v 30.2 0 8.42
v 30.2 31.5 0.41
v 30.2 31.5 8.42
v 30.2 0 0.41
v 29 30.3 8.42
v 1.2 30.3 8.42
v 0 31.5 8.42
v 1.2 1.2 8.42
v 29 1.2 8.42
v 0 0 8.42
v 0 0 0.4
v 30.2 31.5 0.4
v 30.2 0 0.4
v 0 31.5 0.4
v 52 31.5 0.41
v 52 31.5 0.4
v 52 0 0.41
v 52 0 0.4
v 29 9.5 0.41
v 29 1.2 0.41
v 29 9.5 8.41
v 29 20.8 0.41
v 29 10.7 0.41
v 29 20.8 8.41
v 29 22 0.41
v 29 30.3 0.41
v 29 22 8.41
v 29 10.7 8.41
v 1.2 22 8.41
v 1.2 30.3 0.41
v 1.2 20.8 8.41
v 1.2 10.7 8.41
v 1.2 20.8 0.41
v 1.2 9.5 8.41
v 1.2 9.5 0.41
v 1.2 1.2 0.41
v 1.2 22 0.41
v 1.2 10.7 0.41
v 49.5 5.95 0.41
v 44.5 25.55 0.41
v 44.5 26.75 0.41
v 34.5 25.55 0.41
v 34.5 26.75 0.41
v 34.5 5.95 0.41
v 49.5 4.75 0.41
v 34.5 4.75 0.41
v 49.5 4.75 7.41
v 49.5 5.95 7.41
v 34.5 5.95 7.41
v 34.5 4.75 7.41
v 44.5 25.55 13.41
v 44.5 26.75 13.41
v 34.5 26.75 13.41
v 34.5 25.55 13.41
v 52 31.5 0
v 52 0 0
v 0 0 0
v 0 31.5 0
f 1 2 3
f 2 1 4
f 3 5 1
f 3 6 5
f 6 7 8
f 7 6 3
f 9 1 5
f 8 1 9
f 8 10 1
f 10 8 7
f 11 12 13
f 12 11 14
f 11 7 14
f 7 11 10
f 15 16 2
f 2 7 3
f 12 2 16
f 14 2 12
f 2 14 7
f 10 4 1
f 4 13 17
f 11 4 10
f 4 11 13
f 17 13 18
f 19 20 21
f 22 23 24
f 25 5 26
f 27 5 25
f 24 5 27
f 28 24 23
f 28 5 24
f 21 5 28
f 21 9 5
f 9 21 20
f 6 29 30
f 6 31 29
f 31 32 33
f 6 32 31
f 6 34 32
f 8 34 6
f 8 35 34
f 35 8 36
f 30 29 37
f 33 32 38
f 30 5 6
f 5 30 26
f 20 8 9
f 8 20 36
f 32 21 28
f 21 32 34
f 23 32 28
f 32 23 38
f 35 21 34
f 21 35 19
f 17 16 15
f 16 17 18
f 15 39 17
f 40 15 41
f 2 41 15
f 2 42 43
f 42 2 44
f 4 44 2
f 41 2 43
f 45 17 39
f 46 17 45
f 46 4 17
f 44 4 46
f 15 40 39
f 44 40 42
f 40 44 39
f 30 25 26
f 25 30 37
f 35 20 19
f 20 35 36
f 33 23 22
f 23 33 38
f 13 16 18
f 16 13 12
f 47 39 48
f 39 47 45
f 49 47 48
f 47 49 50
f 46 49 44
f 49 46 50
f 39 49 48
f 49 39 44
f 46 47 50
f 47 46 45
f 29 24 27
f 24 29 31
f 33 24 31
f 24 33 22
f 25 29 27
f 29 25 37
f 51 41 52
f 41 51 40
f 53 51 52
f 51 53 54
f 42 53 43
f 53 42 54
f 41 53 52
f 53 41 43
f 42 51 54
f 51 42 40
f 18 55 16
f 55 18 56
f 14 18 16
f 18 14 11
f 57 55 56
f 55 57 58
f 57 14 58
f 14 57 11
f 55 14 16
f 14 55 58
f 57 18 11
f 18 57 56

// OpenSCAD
// file: ../../Base/Boxes.scad
// Fischertechnik Box Foundation
// Pre-designed Boxes

use <Constants.scad>

include <PlacementOptions.scad>

box190Width = 190;
box190Depth = 130;
box130Width = 130;
box130Depth = 95;

// Values are from an original ec3 box
topBottomDifference = 1.5;
outerHeight = 40;
innerHeight = 38.2;
baseThickness = outerHeight - innerHeight;
stackExcess = 5.7;
radius = 3.5;
wallThickness = 1.5;
tolerance = 0.2;
stackOffset = innerHeight - stackExcess;

boxUsageHeight = stackOffset;
boxWallThickness = wallThickness;
boxBaseThickness = baseThickness;
boxWebWidth = 3.0;

// getBoxWallThickness()
// Gets the wall thickness of a Fischertechnik Box
function getBoxWallThickness() = boxWallThickness;

// getBoxUsageHeight()
// Gets the usable height of a Fischertechnik box
function getBoxUsageHeight() = boxUsageHeight;

// getBoxInnerHeight()
// Gets the inner height of a Fischertechnik box, including the stack excess
function getBoxInnerHeight() = innerHeight;

// getBoxBaseThickness()
// Gets the thickness of the Fischertechnik box base.
function getBoxBaseThickness() = boxBaseThickness;

// getBoxWebWidth()
// Gets the width of a box web
function getBoxWebWidth() = boxWebWidth;

// getBox190Space()
// Gets the usable inner space of a Box 190 as an x/y-list
function getBox190Space() = [
    box190Width - 2*getBoxWallThickness() - topBottomDifference, 
    box190Depth - 2*getBoxWallThickness() - topBottomDifference ];

// BoxBase(width, depth)
// Creates an empty stackable Fischertechnik compatible box
// width = Outer width of the box (190, 130, ...)
// depth = Outer depth of the box (130, 95, ...)

module BoxBase(width, depth, height=outerHeight) {    
    thinPlate = 0.01;

    innerHeight = height - baseThickness;    
    
    module BodyPlate(width, depth) {
        translate([radius, radius])
        hull() {
            w = width-2*radius;
            d = depth-2*radius;
            cube([w, d, thinPlate]);
            cylinder(thinPlate, r=radius, $fn=getFragments());
            translate([w, 0])
                cylinder(thinPlate, r=radius, $fn=getFragments());
            translate([w, d])
                cylinder(thinPlate, r=radius, $fn=getFragments());
            translate([0, d])
                cylinder(thinPlate, r=radius, $fn=getFragments());
        }
    }
    
    module Body(tolerance=tolerance) {
        hull() {
            // Bottom with tolerance to fit into the original boxes when stacked
            translate([-wallThickness+tolerance, -wallThickness+tolerance, -baseThickness])
                BodyPlate(width-topBottomDifference-2*tolerance, depth-topBottomDifference-2*tolerance);
            
            // Top
            translate([-wallThickness-topBottomDifference/2, -wallThickness-topBottomDifference/2, innerHeight-thinPlate])
                BodyPlate(width, depth);
         }
    }

    module Cutoff() {
        hull() {
            coWidth = width - 2*wallThickness;
            coDepth = depth - 2*wallThickness;
            
            // Bottom
            BodyPlate(coWidth-topBottomDifference, coDepth-topBottomDifference);

            // Top
            translate([-topBottomDifference/2, -topBottomDifference/2, innerHeight+thinPlate]) 
                BodyPlate(coWidth, coDepth);
        }
    }
    
    difference() {        
        Body();
        Cutoff();
        stackOffset = innerHeight - stackExcess;
        translate([0, 0, stackOffset + baseThickness])
            Body(tolerance=0);
    }
}

// Creates the Fischertechnik empty box 130x190 mm and places it at position 0,0
// 190x130 are the outer sizes, the inner space is slightly smaller. Use getBox190Space() to get the inner sizes.
// The box is positioned that the usable inner space is at the 0,0,0 position. The

module Box190() {
    BoxBase(box190Width, box190Depth);
}

// Gets the usable inner space of a Box 130 as an x/y-list
function getBox130Space() = [
    box130Width - 2*getBoxWallThickness() - topBottomDifference, 
    box130Depth - 2*getBoxWallThickness() - topBottomDifference ];

// Creates the Fischertechnik empty box 95x130 mm and places it at position 0,0
// 190x130 are the outer sizes, the inner space is slightly smaller. Use getBox190Space() to get the inner sizes.
// The box is positioned that the usable inner space is at the 0,0,0 position. The

module Box130() {
    BoxBase(box130Width, box130Depth);
}

// Creates a web at the specified box walls
// corner 0 = LowerLeft, 1 = UpperLeft, 2 = UpperRight, 3 = LowerRight
// side 0 = LeftOfCorner, 1 = RightOfCorner
// distance = Distance in mm from the corner
// boxSpace = inner width and depth of the box (default: Box 190)
// webWidth = length of the web (default is 3 mms)
// webThickness = thickness of the web (default is 1 mm)

module BoxWeb(corner, side, distance, boxSpace=getBox190Space(), webWidth=getBoxWebWidth(), webThickness=1.0) {
    sink = getBoxWallThickness()/2;

    width = (corner % 2 == 0) ? 
            (side == LeftOfCorner ? webWidth : webThickness) :
            (side == LeftOfCorner ? webThickness : webWidth);

    depth = (corner % 2 == 0) ? 
            (side == RightOfCorner ? webWidth : webThickness) :
            (side == RightOfCorner ? webThickness : webWidth);
    
    xDiff = corner == LowerLeft ? 
                (side == LeftOfCorner ? -sink : distance) :
            (corner == UpperLeft ?                
                (side == LeftOfCorner ? distance : -sink) :
            (corner == UpperRight ?
                (side == LeftOfCorner ? boxSpace.x-webWidth+sink : boxSpace.x-distance-webThickness) :
                (side == LeftOfCorner ? boxSpace.x-distance-webThickness: boxSpace.x-webWidth+sink)));

    yDiff = corner == LowerLeft ? 
                (side == RightOfCorner ? -sink : distance) :
            (corner == UpperLeft ?
                (side == RightOfCorner ? boxSpace.y-distance : boxSpace.y-webWidth+sink) :
            (corner == UpperRight ?
                (side == RightOfCorner ? boxSpace.y-webWidth+sink : boxSpace.y-distance) :
                (side == RightOfCorner ? distance : -sink)));
    
    translate([xDiff, yDiff, -getExcess()])
        cube([width, depth, boxUsageHeight + 2*getExcess()]);
}
// file: ../../Base/Rotation.scad
// Fischertechnik Box Foundation
// Geometry Helpers Rotation

include <PlacementOptions.scad>

// getRotatedSpace(space, rotation=NoRotation)
// Rotates the space dependent on the specified rotation

function getRotatedSpace(space, rotation=NoRotation) = [
    (rotation == Rotate90 || rotation == Rotate270) ? space.y : space.x,
    (rotation == Rotate90 || rotation == Rotate270) ? space.x : space.y
];

// Rotates the given space around the fixed left lower corner
// space = the space the children needs as width/depth list [width,depth]
// rotation = 0 Rotate0 degrees, 1 Rotate90 degrees, 2 Rotate180 degrees, 3 Rotate270 degrees (equivalent to -90)

module RotateFix(space, rotation=NoRotation) {
    dy = (rotation == Rotate0 || rotation == Rotate270) ? 0 :
        (rotation == Rotate90) ? space.x :
        space.y;
    dx = (rotation < Rotate180) ? 0 :
        (rotation == Rotate180) ? space.x :
        space.y;
    
    translate([dx, dy, 0])
        rotate([0, 0, rotations[rotation]])
            children();
}
// file: ../../Base/Alignment.scad
// Fischertechnik Box Foundation
// Geometry Helpers Alignment

include <PlacementOptions.scad>

// getAlignedX(elementWidth, spaceWidth, align=AlignRight, offset=0)
// Gets the aligned X offset of an element with the given
// width in the given space.
// elementWidth = The width of the element to positon
// spaceWidth = The space where the element should be aligned
// align = 0 AlignLeft, 1 AlignCenter, 2 AlignRight
// offset = an optional offset from the aligned position. When
// aligned left or centered, then positive values are in X direction.
// When aligned right then positive values are in negative X direction.

function getAlignedX(elementWidth, spaceWidth, align=AlignRight, offset=0) =
    (align == AlignLeft) ?
        offset :
        ((align == AlignCenter) ?
        (spaceWidth - elementWidth)/2 + offset :
        spaceWidth - offset - elementWidth);

// getAlignedY(elementDepth, spaceDepth, align=AlignTop, offset=0)
// Gets the aligned Y offset of an element with the given
// depth in the given space.
// elementDepth = The depth of the element to positon
// spaceDepth = The space where the element should be aligned
// align = 0 AlignBottom, 1 AlignCenter, 2 AlignTop
// offset = an optional offset from the aligned position. When
// aligned bottom or centered, then positive values are in Y direction.
// When aligned top then positive values are in negative Y direction.

function getAlignedY(elementDepth, spaceDepth, align=AlignTop, offset=0) =
    (align == AlignBottom) ?
        offset :
        ((align == AlignCenter) ?
        (spaceDepth - elementDepth)/2 + offset :
        spaceDepth - offset - elementDepth);
// file: ../../Base/Placement.scad
// Fischertechnik Box Foundation
// Geometry Helpers Placement

use <Constants.scad>
use <Alignment.scad>
use <Rotation.scad>
use <Boxes.scad>

include <PlacementOptions.scad>

// Place(x=0, y=0, elementSpace=[0,0], alignX=AlignLeft, alignY=AlignBottom, rotation=Rotate0, boxSpace=getBox190Space())
// Places the child at the specified position
// y = Y-Position. This is a relative position when an X aligment is specified.
// x = X-Position. This is a relative position when an Y aligment is specified.
// elementSpace = space of the element to be placed [x,y]
// alignX = -1=NoAlign, 0 AlignLeft, 1 AlignCenter, 3 AlignRight (elementSpace and boxSpace required!)
// alignY = -1=NoAlign, 2 AlignBottom, 1 AlignCenter, 4 AlignTop (elementSpace and boxSpace required!)
// rotation = 0 Rotate0 0 degrees, 1 Rotate90 90 degrees, 
// 2 Rotate180 180 degrees, 3 Rotate270 270 degrees (equivalent to -90)
// boxSpace = Inner space of the box where the placement occurs [x,y] - default is Box 190x130 inner space

module Place(x=0, y=0, elementSpace=[0,0], 
  alignX=AlignLeft, alignY=AlignBottom, 
  rotation=NoRotation, boxSpace=getBox190Space()) {

    module Position(x, y, space, rotation=Rotate0) {
        translate([x, y, 0])
            RotateFix(space, rotation)
                children();
    }

    space = getRotatedSpace(elementSpace, rotation);
    alignedX = getAlignedX(space.x, boxSpace.x, alignX, x);
    alignedY = getAlignedY(space.y, boxSpace.y, alignY, y);
    Position(alignedX, alignedY, elementSpace, rotation)
        children();
}

// Center(space=getBox130Space(), elementSpace=[0,0])
// space = Space where the children is centered. For cylinder use centered=true and no elementSpace.
// elementSpace = space of the element to be centered [x,y]

module Center(space=getBox190Space(), elementSpace=[0,0]) {
    Place(elementSpace=elementSpace, boxSpace=space, alignX=AlignCenter, alignY=AlignCenter)
        children();
}

// CenterHorizontal(width=0, y=0, offset=0, space=getBox130Space())
// width = Width of the element to be placed.
// y = Y position of the element
// offset = Offset from the center position (negative will be left of the center)
// space = Space where the element is placed

module CenterHorizontal(width=0, y=0, offset=0, space=getBox190Space()) {
    Place(x=offset, y=y, elementSpace=[width, 0], boxSpace=space, alignX=AlignCenter)
        children(0);
}

// CenterVertical(depth=0, x=0, offset=0, space=getBox130Space())
// depth = Depth of the element to be placed.
// x = X position of the element
// offset = Offset from the center position (negative will be down of the center)
// space = Space where the element is placed

module CenterVertical(depth=0, x=0, offset=0, space=getBox190Space()) {
    Place(x=x, y=offset, elementSpace=[0, depth], boxSpace=space, alignY=AlignCenter)
        children(0);
}

// getIsVertical(align)
// True if the specified alignment needs a vertical orientation for a divider (AlignRight, AlignLeft)

function getIsVertical(align) = (align == AlignRight || align == AlignLeft);

// getIsHorizontal(align)
// True if the specified alignment needs a horizontal orientation for a divider (AlignTop, AlignBottom)

function getIsHorizontal(align) = (align == AlignTop || align == AlignBottom);
// file: ../../Base/Helper.scad
// Fischertechnik Box Foundation
// Helper functions

include <PlacementOptions.scad>

// getRotation(rotations, i)
// gets the rotation with index i, even if rotations or rotations[i] is undefined.
// If undefined, NoRotation ist returned.
// rotations = list of Rotate-constants
// i = Index of the rotation
function getRotation(rotations, i) = (is_undef(rotations) || is_undef(rotations[i])) ? NoRotation : rotations[i];
// file: ../../Base/PlacementOptions.scad
// Fischertechnik Box Foundation
// Placement Options

// Alignment
NoAlign = 0;
AlignLeft = 1;
AlignBottom = 2;
AlignCenter = 3;
AlignRight = 4;
AlignTop = 5;

// Element rotation degree steps
rotations = [0, -90, -180, -270];

// Rotation
NoRotation = 0;
Rotate0 = 0;
Rotate90 = 1;
Rotate180 = 2;
Rotate270 = 3;

// Docking (seen from above)
NoDock = -1;
DockLeft = 0;
DockTop = 1;
DockRight = 2;
DockCorner = 2;
DockBottom = 3;

// Web corners
LowerLeft = 0;
UpperLeft = 1;
UpperRight = 2;
LowerRight = 3;

// Web position relative to corner
LeftOfCorner = 0;
RightOfCorner = 1;
// file: ../../Elements/FrameBracketWithoutWorm.scad
// Fischertechnik Box Library
// Frame  for bracket without worm
// 31046

use <../Base/Constants.scad>
use <../ModelBase/Complex.scad>

// getFrameBracketWithoutWormSpace()
// Gets the space for a frame for a bracket with worm.

function getFrameBracketWithoutWormSpace() = getFrameBracketSpace();

// FrameBracketWithoutWorm()
// Frame for bracket with worm.

module FrameBracketWithoutWorm() {
    FrameBracket([ 10, getDividerThickness(), 13 ]);
}

// Test
color("lightgray")
FrameBracketWithoutWorm();
// file: ../../Elements/FrameBracketWithWorm.scad
// Fischertechnik Box Library
// Frame  for bracket with worm
// 31045

use <../Base/Constants.scad>
use <../ModelBase/Complex.scad>

// getFrameBracketWithWormSpace()
// Gets the space for a frame for a bracket with worm.

function getFrameBracketWithWormSpace() = getFrameBracketSpace();

// FrameBracketWithWorm()
// Frame for bracket with worm.

module FrameBracketWithWorm() {
    FrameBracket([ 15, getDividerThickness(), 7 ]);
}

// Test
color("lightgray")
FrameBracketWithWorm();
// file: ../../Elements/AxisClip10.scad
// Fischertechnik Box Library
// Axis for clip 10
// 31023

use <../ModelBase/Simple.scad>
use <../Base/Constants.scad>

width = 12;
depth = 12;
height = 23;
upperDiameter = 3.6;
clipHeight = 10;

// getAxisClip10Space()
// Gets the space of a frame for a clip 10 with spring ring (mot2)

function getAxisClip10Space() = [width, depth, height];

// AxisClip10(height, clipHeight)
// Axis for clip 10 with spring ring (mot2)
// height = Height of the complete axis
// clipHeight = Height of the rt for the clip (standard is 10, in mot3 its only 7)

module AxisClip10(height=height, clipHeight=clipHeight) {
    LeveledAxisWithSpace(height, height-clipHeight, getAxisClip10Space(), diameter=upperDiameter);
}

// Tests
color("lightgray")
AxisClip10();
// file: ../../Base/Constants.scad
// Fischertechnik Box Foundation
// Constants

// Constant values necessary for multiple elements

// Base constants
dividerThickness = 1.2;
excess = 0.01;
fragments = 90;
tolerance = 0.8;

// Gets the thickness of a divider 
function getDividerThickness() = dividerThickness;

// Gets the excess that is used to merge walls into each other
function getExcess() = excess;

// Gets amount of fragments of a cylinder
function getFragments() = fragments;

// Gets the inner tolerance of a frame to each side
function getTolerance() = tolerance;


// Fischertechnik specific constants
axisDiameter = 4;
axisBottomDiameter = axisDiameter + 1;
standardEdgeDistance = 2.5;
standardWebDistance = 11.5;
standardCornerLength = 15;
tubeWallFactor = 0.8;
smallPartsFrameHeight = 20;

// Gets axis diameter
function getAxisDiameter() = axisDiameter;

// Gets axis bottom diameter for thicker part at the bottom
function getAxisBottomDiameter() = axisBottomDiameter;

// gets the standard distance to the wall of the box for dockable frames with webs
function getStandardEdgeDistance() = standardEdgeDistance;

// gets the standard distance of each web to the corner of the dockable frame
function getStandardWebDistance() = standardWebDistance;

// gets the standard length of the corner walls of a dockable frame
function getStandardCornerLength() = standardCornerLength;

// gets the wall thickness of a tube.
function getTubeWallThickness() = tubeWallFactor * getDividerThickness();

// gets the frame height for docked small parts boxes.
function getSmallPartsFrameHeight() = smallPartsFrameHeight;
// file: ../../Elements/ComboFrameBrackets.scad
// Fischertechnik Box Library
// Frames for brackets with and without worm
// 31045 + 31046

use <../Base/Constants.scad>
use <../Base/Deployment.scad>
use <../ModelBase/Simple.scad>
use <../ModelBase/Complex.scad>
use <FrameBracketWithWorm.scad>
use <FrameBracketWithoutWorm.scad>

include <../Base/PlacementOptions.scad>

outerDepth = 31.5;

// getComboFrameBracketsSpace()
// Gets the space for a frame for a combination of brackets with worm and without worm.

function getComboFrameBracketsSpace() = [getFrameBracketSpace().x, outerDepth];

// ComboFrameBrackets()
// Frame for a combination of brackets with worm and without worm.

module ComboFrameBrackets() {
    Space(getComboFrameBracketsSpace());
    Frame([getFrameBracketWidth(), outerDepth - 2*getDividerThickness() - getTolerance(), getFrameBracketSpace().z]);
    DeployVertical(outerDepth, [getFrameBracketWithWormSpace(), getFrameBracketWithoutWormSpace()], [Rotate0, Rotate0]) {
        FrameBracketWithWorm();
        FrameBracketWithoutWorm();
    }
}

// Test
color("lightgray")
ComboFrameBrackets();
// file: ../TestPrint.scad
// 3D Print Test Base

use <../Base/Constants.scad>

use <../Elements/AxisClip10.scad>

module TestPrint(elementSpace) {
    cube([elementSpace.x, elementSpace.y, 0.4]);
    translate([0,0,0.4+getExcess()]) {
        children();
    }
}

TestPrint(getAxisClip10Space())
    AxisClip10();
// main file
// 3D Print Test
// ComboFrameBrackets

use <../TestPrint.scad>
use <../../Elements/ComboFrameBrackets.scad>

TestPrint(getComboFrameBracketsSpace())
    ComboFrameBrackets();
